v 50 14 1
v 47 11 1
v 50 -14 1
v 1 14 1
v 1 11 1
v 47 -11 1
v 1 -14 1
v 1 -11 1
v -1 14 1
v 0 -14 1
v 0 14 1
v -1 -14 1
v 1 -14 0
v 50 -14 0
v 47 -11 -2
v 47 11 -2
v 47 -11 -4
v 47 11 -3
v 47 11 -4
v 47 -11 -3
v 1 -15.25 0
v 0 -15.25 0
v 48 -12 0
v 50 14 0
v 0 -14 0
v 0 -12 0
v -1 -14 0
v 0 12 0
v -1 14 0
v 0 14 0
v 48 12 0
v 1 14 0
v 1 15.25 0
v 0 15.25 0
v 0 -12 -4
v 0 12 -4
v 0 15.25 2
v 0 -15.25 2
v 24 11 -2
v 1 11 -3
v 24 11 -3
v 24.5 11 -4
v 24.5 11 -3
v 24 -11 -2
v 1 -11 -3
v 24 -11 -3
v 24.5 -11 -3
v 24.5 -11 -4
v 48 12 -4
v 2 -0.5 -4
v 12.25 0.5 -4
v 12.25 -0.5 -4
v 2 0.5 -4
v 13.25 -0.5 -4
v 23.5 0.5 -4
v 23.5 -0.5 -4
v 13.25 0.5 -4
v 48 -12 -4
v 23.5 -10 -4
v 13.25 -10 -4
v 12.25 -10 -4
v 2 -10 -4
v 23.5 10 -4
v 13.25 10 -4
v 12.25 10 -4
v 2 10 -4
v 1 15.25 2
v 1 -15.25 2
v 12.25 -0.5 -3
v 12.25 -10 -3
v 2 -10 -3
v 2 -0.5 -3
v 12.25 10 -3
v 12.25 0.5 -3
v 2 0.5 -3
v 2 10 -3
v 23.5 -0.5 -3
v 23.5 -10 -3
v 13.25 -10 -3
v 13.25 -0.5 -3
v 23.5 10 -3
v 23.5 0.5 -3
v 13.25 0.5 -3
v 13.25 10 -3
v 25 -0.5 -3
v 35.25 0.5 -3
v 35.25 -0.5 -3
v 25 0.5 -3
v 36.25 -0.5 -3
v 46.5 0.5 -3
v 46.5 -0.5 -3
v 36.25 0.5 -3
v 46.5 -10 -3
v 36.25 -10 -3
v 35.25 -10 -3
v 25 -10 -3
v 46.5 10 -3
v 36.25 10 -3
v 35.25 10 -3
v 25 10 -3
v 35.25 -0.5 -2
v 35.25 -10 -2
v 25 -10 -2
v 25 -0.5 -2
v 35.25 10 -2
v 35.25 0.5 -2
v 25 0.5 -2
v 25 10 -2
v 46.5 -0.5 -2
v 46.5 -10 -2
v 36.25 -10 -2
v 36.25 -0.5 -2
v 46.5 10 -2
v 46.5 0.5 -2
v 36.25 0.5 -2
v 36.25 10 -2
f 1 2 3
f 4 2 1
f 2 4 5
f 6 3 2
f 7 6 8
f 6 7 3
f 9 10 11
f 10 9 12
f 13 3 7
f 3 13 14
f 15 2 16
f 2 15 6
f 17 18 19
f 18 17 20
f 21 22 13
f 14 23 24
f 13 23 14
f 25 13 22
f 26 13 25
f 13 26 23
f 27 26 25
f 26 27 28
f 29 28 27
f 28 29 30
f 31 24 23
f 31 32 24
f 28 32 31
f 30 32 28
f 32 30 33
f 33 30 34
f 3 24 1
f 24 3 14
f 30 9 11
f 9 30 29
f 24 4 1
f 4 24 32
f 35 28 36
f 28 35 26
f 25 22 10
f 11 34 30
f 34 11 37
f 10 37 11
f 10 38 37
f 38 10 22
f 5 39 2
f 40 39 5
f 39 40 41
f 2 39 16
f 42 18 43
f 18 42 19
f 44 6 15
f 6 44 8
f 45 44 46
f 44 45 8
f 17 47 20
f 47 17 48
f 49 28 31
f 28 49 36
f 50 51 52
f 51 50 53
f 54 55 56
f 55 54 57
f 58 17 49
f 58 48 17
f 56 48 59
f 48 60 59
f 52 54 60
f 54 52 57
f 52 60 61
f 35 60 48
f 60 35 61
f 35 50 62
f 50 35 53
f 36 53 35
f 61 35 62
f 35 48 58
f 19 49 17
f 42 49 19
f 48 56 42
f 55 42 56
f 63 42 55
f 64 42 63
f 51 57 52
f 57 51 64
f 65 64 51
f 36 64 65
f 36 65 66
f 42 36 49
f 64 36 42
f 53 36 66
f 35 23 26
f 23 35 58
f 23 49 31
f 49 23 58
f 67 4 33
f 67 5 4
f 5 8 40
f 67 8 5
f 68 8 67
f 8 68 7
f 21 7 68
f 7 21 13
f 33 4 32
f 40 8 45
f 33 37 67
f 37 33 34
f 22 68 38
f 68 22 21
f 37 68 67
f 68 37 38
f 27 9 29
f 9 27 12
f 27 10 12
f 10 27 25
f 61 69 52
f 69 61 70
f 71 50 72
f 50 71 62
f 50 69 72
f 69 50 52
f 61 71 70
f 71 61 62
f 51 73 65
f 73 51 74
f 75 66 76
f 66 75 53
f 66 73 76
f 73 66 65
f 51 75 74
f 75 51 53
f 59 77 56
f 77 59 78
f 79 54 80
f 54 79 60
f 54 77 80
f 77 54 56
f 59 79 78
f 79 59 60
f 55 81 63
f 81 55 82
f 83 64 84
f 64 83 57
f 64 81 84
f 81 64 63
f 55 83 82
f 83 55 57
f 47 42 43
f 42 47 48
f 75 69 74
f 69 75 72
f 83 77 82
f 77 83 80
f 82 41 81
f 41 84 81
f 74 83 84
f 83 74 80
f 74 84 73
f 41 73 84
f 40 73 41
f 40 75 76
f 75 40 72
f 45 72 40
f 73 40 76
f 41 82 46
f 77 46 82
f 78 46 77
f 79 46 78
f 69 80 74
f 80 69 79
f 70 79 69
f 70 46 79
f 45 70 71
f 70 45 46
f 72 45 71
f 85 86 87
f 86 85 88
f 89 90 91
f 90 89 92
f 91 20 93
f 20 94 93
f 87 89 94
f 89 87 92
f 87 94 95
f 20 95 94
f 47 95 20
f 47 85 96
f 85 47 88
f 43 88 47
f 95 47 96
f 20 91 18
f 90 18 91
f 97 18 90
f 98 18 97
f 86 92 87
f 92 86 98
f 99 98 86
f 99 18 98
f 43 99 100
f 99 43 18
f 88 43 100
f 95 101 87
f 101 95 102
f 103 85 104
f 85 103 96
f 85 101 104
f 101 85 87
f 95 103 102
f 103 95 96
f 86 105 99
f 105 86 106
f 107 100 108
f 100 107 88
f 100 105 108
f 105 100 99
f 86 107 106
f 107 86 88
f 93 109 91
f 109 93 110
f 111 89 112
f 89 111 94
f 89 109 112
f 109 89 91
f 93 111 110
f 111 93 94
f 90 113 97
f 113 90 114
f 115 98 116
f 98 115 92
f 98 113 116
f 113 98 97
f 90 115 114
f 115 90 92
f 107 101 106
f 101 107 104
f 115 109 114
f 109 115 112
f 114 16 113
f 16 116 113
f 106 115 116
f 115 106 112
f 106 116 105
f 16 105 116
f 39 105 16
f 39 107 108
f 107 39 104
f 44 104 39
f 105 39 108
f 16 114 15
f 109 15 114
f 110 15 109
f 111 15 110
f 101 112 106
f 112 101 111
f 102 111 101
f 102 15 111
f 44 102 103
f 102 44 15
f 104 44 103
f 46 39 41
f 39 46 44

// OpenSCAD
/*
OpenSCAD double-hung window
Author: Glenn Butcher
License: CC-BY-4.0

Builds a double-hung window designed to fit in a specific wall opening. 
The pane layout of each sash can be specified as a pair of row,column 
values, e.g., [2,2] for a four-pane sash, two rows, two columns.

Instructions:

1. Install OpenSCAD.
2. Run OpenSCAD and load this script.
3. Change the below values to define your needed window.  The whole script
	works on the basis of a defined opening width and opening height in the 
	receiving wall.  The sash layout values are row,column pairs, tells the
	script to lay out sash panes in the number of rows and columns specified.
4. Render the window in the preview pane with the F5 key.
5. Repeat #3 and #4 until satisfied.
6. Render the final mesh with the F6 key.  Depending on your computer, this
	may take a few seconds.
7. Save the .stl file with the menu, File->Export...->Export as STL

Hacking:

The window frame is drawn as a set of calls to board(), so the boards aren't
too fancy.  You can define your own board_*() module(s) and replace the 
appropriate board calls in the windowframe() module.

The two sashes are placed like they would be in a real window, staggered
in depth.  You can change that by modifying the z parameter in the translate()
call before each sash() call in the doublehung_window() module.


*/

//Modify these values to suit your window requirements:
openingwidth=24;
openingheight=48;
windowdepth=5;
boardwidth=3;
boardthickness=1;
sashmuntinwidth=1;
sashdepth=1;
uppersashlayout=[2,2];
lowersashlayout=[2,2];
lowersashoffset=0;
uppersashoffset=0;

//draws a sash with the defined pane layout
module sash(width, height, thickness, depth, panelayout=[2,2]) {
	muntinsh = thickness*2 + thickness*(panelayout[0]-1); //accumulate muntins in height
	muntinsw = thickness*2 + thickness*(panelayout[1]-1); //accumulate muntins in width
	paneheight = (height-muntinsh)/(panelayout[0]);
	panewidth = (width-muntinsw)/(panelayout[1]);
	translate([depth,-width/2,0]) {
		rotate([0,-90,0]) {
			difference() {
				//base sash:
				cube([height, width, depth]);
		
				//subtract panes:
				for (r = [1:1:panelayout[0]]) { //rows
					for (c = [1:1:panelayout[1]]) {  //columns
						translate([thickness*r+paneheight*(r-1),thickness*c+panewidth*(c-1),-depth/2]) 
							cube([paneheight, panewidth, depth*2]);
					}
				}
			}
		}
	}
}

//draws a board in the x direction:
module board(length, width, thickness) {
		translate([0,-width/2,0]) cube([length, width, thickness]);
}

//draws the window frame using a bunch of board()s, anchored to wall opening width and height:
module windowframe(openingwidth, openingheight, depth, boardwidth, boardthickness) { //, uppersash=[1,2], lowersash=[1,2]) {
	
	//head:
	translate([openingheight-boardthickness,boardthickness,depth-boardthickness]) //move board to edge of openingheight
		translate([boardwidth/2,-(openingwidth+boardwidth*2)/2,0]) //put board edge on y axis
			rotate([0,0,90])
				board(openingwidth+boardwidth*2-boardthickness*2, boardwidth, boardthickness);

	//casings:
	//left:
	translate([0,openingwidth/2+boardwidth/2-boardthickness,depth-boardthickness])
		board(openingheight-boardthickness,boardwidth,boardthickness);
	//right;
	translate([0,-openingwidth/2-boardwidth/2+boardthickness,depth-boardthickness])
		board(openingheight-boardthickness,boardwidth,boardthickness);

	//jambs:
	//left:
	translate([0,openingwidth/2,(depth-boardthickness)/2])
		rotate([90,0,0])
			board(openingheight-boardthickness,depth-boardthickness,boardthickness);
	//right:
	translate([0,-openingwidth/2+boardthickness,(depth-boardthickness)/2])
		rotate([90,0,0])
			board(openingheight-boardthickness,depth-boardthickness,boardthickness);
	//top:
	translate([openingheight-boardthickness,-(openingwidth)/2,(depth-boardthickness)/2])
		rotate([90,0,90])
			board(openingwidth, depth-boardthickness, boardthickness);

	//sill:
	translate([0,-openingwidth/2+boardthickness,depth/2])
		rotate([90,0,90])
			board(openingwidth-boardthickness*2, depth, boardthickness);
	translate([0,-(openingwidth+boardwidth*2+boardthickness/2)/2,depth])
		rotate([90,0,90])
			board(openingwidth+boardwidth*2+boardthickness/2, boardthickness*2, boardthickness);
	translate([-boardthickness,-(openingwidth+boardwidth*2-boardthickness*2)/2,depth-boardthickness/2])
		rotate([90,0,90])
			board(openingwidth+boardwidth*2-boardthickness*2, boardthickness, boardthickness);
}

//draws a double-hung window anchored to an opening width and height with the specified sash layout:
module doublehung_window(openingwidth, openingheight, depth, boardwidth, boardthickness, sashthickness, sashdepth, uppersash, lowersash) {
	translate([0,0,-depth+boardthickness]) {
		windowframe(openingwidth, openingheight, depth, boardwidth, boardthickness);
		sh = (openingheight/2)-sashthickness/2;
		translate([boardthickness,0,sashdepth+lowersashoffset]) rotate([0,90,0]) sash(openingwidth-boardthickness*2,sh,sashthickness,sashdepth,uppersash);
		translate([openingheight/2,0,sashdepth*2+uppersashoffset]) rotate([0,90,0]) sash(openingwidth-boardthickness*2,sh,sashthickness,sashdepth, lowersash);
	}
}

//scale(1/87)		//HO scale
//	scale(25.4) //inches to millimeters
		doublehung_window(openingwidth, openingheight, windowdepth, boardwidth, boardthickness, sashmuntinwidth, sashdepth, lowersashlayout, uppersashlayout );
